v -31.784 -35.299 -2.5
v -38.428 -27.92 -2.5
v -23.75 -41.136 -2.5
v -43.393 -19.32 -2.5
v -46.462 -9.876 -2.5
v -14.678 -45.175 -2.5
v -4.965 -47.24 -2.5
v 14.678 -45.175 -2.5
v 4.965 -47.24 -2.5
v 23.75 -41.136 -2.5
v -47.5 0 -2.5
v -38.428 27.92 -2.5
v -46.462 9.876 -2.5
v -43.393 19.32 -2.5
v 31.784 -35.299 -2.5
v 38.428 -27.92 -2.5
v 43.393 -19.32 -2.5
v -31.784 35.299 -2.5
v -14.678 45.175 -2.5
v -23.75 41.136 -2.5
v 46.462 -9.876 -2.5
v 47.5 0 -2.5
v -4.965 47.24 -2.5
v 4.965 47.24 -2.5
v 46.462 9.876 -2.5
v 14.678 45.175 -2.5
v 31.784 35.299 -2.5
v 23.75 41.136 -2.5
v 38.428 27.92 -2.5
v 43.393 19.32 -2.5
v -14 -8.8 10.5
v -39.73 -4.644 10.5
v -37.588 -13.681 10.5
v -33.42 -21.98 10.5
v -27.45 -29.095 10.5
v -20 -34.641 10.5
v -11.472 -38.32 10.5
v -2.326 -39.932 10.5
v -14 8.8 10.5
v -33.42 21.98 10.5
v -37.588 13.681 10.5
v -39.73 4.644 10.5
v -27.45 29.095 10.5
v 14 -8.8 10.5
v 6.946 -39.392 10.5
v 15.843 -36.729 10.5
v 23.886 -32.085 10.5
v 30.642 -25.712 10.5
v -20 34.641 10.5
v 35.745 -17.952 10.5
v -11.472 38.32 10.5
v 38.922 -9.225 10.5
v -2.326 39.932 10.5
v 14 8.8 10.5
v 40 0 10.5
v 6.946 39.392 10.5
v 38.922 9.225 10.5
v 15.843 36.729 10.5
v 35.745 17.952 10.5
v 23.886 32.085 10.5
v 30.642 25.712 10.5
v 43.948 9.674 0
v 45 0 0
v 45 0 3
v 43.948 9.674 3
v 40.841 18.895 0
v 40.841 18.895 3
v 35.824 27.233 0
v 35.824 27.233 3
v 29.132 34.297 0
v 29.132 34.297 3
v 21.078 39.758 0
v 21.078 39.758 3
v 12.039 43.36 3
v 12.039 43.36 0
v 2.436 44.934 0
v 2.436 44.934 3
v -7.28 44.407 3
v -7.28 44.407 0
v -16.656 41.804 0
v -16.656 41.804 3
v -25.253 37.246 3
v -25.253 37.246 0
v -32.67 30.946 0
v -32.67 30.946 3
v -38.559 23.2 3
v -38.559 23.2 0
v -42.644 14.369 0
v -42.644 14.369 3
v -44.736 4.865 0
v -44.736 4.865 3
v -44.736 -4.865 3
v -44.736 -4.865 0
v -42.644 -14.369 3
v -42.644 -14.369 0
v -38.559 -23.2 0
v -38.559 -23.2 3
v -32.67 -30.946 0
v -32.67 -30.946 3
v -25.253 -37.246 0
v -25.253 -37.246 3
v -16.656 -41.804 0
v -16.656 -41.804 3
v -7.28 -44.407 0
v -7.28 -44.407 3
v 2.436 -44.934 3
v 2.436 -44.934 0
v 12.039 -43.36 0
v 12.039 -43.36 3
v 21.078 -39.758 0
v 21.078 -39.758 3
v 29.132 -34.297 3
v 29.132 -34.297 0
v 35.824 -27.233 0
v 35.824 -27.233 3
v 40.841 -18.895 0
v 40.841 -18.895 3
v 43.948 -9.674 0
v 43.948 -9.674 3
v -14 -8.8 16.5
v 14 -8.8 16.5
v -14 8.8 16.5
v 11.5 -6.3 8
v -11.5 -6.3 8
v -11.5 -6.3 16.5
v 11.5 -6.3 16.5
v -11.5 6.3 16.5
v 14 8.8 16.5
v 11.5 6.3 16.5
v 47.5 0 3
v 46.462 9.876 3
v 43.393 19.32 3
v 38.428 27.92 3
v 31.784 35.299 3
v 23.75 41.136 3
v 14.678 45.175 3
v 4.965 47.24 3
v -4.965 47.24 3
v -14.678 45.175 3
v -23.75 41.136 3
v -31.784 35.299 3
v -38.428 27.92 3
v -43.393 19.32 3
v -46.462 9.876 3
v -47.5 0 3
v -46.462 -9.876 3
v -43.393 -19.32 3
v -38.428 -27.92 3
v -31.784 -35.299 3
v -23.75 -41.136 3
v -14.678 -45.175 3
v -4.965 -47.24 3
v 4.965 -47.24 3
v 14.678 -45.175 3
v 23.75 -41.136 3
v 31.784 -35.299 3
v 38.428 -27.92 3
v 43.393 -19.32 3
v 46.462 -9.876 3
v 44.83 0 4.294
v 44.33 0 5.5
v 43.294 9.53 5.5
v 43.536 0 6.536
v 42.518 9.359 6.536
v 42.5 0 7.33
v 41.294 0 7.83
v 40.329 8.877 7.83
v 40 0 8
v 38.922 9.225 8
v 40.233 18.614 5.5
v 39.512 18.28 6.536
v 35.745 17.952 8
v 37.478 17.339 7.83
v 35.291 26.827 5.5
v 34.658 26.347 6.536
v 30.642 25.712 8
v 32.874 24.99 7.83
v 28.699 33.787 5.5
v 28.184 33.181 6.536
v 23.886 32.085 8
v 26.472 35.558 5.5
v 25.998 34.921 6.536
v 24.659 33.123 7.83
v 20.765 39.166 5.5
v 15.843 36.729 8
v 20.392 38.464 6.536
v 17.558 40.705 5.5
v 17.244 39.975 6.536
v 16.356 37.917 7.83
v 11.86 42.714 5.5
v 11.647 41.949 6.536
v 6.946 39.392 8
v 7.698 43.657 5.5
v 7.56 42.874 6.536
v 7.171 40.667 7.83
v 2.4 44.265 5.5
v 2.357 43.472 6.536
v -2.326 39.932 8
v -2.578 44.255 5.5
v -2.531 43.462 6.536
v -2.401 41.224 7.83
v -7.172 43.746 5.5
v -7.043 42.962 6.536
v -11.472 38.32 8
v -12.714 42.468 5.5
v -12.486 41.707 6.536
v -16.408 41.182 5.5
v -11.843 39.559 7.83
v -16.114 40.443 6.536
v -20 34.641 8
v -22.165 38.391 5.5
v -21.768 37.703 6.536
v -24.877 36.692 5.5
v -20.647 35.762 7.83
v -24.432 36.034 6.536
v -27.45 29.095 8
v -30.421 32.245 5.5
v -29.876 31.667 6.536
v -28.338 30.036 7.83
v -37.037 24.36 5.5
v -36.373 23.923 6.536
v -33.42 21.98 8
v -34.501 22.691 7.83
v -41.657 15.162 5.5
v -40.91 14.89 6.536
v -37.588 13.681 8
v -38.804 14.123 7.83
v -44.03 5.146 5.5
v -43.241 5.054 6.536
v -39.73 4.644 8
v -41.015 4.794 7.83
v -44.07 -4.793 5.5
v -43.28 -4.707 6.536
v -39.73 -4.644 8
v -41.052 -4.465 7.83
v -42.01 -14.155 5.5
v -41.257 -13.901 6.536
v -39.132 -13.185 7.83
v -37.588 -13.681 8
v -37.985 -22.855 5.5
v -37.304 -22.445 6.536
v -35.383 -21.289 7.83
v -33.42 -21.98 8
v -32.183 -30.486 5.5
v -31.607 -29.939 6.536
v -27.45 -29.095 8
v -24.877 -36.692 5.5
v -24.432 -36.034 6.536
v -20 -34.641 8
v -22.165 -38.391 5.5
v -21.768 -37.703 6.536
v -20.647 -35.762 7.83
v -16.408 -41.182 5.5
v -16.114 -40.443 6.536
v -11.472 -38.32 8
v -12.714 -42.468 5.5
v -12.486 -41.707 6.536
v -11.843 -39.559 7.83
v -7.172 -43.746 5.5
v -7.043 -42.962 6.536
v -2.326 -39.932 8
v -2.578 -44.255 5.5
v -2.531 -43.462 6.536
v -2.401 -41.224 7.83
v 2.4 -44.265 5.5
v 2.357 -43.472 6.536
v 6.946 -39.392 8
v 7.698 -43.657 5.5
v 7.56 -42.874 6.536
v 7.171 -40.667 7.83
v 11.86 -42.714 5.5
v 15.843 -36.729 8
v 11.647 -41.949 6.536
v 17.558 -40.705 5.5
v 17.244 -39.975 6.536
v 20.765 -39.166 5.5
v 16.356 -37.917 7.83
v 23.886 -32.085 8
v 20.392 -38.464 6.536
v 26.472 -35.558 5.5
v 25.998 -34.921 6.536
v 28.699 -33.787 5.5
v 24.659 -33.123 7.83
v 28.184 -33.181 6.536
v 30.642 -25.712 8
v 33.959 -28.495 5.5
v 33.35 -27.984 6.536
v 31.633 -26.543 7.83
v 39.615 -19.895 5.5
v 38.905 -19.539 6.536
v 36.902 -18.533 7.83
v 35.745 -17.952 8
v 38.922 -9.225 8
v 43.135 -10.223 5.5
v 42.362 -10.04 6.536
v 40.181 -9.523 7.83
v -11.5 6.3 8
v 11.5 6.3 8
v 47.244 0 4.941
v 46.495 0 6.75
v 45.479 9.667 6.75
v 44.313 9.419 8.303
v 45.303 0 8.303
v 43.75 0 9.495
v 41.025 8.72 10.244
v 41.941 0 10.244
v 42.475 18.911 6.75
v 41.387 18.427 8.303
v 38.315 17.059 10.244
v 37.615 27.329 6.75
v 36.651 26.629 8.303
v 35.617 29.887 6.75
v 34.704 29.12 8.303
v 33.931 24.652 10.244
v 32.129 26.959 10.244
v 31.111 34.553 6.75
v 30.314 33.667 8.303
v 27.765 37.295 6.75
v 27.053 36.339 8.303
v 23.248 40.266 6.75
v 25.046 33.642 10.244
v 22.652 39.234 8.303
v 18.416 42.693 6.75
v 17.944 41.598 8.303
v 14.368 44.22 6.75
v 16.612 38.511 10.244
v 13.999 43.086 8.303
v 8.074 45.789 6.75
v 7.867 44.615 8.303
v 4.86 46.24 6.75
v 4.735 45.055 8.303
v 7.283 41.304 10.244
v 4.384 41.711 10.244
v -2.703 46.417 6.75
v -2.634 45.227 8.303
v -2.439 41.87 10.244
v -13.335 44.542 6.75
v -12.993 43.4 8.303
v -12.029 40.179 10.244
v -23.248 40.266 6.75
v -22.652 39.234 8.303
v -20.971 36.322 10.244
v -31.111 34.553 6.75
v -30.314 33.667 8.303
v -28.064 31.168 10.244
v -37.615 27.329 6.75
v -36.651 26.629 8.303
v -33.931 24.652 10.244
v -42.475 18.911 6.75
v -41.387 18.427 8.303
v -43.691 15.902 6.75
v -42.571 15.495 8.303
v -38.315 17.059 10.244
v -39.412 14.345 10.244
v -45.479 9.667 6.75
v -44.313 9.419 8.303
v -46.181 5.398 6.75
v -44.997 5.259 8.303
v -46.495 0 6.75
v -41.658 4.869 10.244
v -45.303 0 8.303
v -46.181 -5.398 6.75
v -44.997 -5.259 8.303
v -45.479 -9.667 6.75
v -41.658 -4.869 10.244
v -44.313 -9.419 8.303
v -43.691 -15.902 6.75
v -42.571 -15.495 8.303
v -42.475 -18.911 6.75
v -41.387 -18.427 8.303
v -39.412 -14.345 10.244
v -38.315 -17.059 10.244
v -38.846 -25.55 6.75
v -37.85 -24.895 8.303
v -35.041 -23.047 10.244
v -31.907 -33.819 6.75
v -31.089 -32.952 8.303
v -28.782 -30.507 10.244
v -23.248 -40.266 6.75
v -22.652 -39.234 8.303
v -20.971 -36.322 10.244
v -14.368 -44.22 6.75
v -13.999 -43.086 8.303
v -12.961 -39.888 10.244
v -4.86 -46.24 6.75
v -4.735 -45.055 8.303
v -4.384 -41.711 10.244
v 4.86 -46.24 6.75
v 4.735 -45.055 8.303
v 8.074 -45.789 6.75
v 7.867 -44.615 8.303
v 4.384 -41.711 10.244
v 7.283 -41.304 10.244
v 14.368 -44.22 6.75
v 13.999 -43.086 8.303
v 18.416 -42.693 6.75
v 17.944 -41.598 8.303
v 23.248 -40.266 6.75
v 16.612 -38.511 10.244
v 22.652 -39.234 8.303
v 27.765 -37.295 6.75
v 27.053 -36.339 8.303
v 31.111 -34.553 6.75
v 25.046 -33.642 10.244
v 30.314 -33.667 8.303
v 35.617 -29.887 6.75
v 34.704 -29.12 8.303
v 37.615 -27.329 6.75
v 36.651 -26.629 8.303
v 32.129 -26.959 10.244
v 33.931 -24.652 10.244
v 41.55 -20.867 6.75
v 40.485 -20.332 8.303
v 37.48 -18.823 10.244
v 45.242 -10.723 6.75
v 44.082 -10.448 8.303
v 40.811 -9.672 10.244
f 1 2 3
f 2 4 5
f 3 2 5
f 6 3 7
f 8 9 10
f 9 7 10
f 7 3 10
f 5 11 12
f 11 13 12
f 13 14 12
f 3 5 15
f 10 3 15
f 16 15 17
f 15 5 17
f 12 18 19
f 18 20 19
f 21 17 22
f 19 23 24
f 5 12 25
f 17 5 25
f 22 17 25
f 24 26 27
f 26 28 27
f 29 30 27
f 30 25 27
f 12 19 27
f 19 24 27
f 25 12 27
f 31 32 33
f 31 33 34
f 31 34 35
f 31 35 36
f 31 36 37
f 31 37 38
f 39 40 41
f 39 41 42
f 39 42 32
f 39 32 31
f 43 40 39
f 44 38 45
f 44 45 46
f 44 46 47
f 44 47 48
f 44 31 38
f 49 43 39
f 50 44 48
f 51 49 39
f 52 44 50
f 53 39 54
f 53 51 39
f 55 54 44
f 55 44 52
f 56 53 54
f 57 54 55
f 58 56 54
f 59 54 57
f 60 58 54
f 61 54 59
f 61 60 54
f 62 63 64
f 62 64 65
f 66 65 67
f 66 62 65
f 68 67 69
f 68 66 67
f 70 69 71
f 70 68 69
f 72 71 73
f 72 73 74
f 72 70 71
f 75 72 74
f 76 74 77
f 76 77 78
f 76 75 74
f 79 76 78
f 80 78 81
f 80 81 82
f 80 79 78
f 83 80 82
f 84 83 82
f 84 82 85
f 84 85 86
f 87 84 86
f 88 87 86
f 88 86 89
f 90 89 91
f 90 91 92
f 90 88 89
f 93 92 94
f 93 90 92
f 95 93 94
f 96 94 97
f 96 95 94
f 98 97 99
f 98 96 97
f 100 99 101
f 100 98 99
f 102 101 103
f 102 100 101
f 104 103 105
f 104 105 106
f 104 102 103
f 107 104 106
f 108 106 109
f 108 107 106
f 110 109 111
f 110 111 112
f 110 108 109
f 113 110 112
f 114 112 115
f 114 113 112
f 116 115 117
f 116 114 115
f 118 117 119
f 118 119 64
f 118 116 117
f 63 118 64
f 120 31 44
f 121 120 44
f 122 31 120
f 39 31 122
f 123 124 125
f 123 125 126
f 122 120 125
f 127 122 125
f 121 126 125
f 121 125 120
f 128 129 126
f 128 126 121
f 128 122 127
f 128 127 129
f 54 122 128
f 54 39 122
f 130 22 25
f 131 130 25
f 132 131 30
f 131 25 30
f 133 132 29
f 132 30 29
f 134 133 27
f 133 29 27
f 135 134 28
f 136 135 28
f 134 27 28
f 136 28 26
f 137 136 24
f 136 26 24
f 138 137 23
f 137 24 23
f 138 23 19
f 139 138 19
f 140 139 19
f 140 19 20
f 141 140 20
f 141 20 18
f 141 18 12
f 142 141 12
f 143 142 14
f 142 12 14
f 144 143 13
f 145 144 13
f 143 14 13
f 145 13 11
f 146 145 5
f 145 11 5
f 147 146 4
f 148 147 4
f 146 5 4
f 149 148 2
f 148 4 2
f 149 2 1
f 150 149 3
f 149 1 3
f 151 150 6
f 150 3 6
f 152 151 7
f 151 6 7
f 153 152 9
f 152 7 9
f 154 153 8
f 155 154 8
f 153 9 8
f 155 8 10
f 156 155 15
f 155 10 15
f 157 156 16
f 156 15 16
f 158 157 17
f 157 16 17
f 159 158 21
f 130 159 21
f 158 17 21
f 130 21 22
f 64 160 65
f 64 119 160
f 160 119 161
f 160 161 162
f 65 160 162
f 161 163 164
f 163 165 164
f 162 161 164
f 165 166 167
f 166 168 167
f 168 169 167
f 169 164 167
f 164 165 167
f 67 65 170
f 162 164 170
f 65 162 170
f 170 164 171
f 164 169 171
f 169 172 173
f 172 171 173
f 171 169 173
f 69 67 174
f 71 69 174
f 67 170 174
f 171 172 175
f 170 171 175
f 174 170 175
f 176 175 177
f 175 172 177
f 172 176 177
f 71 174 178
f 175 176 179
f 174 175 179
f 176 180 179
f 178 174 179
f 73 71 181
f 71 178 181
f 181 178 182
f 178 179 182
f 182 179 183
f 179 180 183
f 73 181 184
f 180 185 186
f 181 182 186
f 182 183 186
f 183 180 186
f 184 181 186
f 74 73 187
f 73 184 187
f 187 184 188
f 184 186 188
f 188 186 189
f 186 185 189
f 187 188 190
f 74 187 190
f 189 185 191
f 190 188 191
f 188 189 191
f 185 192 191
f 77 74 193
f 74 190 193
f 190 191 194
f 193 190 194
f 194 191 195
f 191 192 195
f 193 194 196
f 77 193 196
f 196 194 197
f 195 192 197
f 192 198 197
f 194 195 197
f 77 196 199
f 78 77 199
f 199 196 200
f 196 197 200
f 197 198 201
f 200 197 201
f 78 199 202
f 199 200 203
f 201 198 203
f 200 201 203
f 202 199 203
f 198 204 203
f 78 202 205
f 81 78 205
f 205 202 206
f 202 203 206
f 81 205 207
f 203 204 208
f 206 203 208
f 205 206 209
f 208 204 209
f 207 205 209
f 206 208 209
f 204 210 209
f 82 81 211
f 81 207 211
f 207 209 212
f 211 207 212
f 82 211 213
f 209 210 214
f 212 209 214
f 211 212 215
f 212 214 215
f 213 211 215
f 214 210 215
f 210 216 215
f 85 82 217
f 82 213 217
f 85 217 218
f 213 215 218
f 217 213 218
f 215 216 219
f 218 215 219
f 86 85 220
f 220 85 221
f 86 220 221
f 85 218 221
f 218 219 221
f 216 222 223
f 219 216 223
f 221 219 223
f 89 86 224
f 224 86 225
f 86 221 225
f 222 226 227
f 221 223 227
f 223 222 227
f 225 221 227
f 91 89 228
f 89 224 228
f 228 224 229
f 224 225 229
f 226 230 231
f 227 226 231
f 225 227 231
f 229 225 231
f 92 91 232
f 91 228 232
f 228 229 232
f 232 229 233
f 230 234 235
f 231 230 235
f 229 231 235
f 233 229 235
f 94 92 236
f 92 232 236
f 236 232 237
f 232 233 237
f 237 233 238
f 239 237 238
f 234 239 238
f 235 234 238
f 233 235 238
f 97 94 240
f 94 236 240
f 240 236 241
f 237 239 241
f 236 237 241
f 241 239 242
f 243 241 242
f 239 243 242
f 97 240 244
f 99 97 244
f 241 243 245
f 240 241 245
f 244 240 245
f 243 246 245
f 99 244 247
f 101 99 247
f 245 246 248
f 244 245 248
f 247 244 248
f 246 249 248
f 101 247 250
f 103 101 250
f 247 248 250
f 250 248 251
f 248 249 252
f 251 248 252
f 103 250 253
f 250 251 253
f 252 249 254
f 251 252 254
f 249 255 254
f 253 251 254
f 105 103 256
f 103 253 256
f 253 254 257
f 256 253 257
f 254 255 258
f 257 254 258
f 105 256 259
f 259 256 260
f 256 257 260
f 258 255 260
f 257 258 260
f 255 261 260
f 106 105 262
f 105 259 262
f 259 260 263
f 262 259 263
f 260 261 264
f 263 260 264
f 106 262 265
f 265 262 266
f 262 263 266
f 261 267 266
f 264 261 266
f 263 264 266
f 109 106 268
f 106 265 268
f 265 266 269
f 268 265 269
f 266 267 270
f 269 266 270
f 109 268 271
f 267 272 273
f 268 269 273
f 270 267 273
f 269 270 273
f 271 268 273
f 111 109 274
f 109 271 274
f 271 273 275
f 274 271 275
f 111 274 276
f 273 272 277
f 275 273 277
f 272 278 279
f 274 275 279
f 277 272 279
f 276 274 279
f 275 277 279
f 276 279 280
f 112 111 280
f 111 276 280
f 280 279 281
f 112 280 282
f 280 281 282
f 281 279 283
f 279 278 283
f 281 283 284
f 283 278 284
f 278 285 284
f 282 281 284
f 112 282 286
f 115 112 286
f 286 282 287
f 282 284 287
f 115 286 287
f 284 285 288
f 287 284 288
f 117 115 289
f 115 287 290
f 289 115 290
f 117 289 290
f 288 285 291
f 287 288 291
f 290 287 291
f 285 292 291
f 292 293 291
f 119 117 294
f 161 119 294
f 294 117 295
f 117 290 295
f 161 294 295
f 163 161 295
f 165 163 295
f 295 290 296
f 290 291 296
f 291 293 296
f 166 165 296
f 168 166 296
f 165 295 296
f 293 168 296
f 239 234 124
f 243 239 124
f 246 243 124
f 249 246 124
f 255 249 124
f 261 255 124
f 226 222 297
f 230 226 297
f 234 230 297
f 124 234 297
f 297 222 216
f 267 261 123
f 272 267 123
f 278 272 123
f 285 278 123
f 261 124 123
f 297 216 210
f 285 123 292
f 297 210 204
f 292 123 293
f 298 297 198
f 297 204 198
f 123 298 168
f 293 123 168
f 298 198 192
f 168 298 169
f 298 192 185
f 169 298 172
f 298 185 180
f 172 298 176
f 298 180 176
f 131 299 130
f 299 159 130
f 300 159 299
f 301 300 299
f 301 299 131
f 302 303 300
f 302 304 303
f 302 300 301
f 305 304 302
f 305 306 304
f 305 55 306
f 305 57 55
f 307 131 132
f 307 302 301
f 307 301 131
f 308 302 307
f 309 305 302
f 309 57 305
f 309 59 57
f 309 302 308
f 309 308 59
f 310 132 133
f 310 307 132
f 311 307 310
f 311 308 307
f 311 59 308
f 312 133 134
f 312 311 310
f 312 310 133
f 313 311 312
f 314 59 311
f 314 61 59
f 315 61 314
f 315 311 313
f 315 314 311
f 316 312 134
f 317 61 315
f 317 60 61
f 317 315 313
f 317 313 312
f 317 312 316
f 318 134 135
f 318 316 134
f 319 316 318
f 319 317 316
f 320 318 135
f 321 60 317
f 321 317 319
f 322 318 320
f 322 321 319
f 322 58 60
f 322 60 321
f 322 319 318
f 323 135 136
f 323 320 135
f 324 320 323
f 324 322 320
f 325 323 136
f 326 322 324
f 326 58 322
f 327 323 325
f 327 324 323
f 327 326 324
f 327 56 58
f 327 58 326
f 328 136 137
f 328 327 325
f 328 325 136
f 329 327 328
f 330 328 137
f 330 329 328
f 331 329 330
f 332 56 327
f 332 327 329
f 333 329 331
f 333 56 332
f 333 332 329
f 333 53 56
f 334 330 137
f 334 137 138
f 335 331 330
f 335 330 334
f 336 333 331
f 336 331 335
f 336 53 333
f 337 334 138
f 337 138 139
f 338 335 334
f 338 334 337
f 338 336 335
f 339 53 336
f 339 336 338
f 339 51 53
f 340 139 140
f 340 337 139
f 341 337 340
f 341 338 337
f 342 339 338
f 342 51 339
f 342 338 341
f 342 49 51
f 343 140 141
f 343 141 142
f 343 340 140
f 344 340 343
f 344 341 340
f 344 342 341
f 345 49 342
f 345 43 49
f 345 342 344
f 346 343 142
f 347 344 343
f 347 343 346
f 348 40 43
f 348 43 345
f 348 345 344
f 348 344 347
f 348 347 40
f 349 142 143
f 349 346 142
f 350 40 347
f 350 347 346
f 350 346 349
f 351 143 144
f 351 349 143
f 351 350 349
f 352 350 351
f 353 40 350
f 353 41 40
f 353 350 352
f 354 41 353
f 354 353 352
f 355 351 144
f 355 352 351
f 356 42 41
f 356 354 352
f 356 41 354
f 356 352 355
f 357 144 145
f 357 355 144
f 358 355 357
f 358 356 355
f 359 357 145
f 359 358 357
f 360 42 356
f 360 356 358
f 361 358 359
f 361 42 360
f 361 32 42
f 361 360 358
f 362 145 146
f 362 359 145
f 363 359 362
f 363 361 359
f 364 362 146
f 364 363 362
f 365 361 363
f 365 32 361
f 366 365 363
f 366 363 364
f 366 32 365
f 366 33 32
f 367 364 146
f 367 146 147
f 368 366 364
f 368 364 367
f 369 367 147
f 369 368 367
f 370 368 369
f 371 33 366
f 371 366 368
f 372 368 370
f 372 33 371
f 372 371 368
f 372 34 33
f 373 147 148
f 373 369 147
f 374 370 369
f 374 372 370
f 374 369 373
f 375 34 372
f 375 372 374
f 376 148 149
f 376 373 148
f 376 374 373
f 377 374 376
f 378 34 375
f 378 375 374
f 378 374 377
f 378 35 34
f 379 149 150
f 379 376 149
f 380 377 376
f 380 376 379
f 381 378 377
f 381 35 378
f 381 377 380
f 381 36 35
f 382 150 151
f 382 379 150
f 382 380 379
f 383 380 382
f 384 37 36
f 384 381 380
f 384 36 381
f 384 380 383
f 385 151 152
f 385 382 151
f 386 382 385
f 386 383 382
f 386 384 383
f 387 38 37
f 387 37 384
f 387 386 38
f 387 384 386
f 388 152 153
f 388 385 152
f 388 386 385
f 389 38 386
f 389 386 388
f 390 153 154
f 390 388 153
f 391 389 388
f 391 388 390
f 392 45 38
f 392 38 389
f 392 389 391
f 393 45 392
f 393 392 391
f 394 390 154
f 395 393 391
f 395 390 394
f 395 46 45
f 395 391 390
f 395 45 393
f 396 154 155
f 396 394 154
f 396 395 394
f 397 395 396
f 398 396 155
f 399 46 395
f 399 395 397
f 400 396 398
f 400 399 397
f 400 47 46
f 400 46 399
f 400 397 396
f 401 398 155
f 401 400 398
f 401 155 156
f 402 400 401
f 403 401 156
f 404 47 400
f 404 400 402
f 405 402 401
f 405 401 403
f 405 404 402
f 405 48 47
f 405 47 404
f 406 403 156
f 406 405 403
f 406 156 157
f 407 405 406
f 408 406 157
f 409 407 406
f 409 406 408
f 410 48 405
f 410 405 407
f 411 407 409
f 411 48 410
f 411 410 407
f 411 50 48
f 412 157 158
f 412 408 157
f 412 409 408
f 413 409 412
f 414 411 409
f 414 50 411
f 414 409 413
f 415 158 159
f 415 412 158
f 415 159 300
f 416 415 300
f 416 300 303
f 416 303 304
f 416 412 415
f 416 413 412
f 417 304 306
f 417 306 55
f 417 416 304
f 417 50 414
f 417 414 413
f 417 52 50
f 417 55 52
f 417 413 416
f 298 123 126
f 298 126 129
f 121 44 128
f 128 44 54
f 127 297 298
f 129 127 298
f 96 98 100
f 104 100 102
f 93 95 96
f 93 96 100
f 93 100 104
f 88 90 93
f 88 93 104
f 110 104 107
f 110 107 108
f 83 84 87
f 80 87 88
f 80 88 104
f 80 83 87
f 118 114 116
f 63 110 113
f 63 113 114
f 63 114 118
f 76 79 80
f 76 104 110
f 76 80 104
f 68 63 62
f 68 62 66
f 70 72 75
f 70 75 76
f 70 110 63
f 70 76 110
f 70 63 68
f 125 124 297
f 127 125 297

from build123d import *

# Parameters (mm, degrees)
F0_R     = 45
F1_DEPTH = 8
F2_R     = 5
F3_W     = 23
F3_H     = 12.6
F4_DEPTH = 16.5
F5_T     = 2.5


with BuildPart() as f1:
    # F0 (on Top) → F1 (new body)
    with BuildSketch(Plane.XY):
        Circle(F0_R)
    extrude(amount=F1_DEPTH)

    # F2
    f2_edges = [f1.edges().sort_by_distance(p)[0] for p in [
        (-45, 0, 8),
    ]]
    fillet(f2_edges, radius=F2_R)

    # F3 (on Top) → F4 (join)
    with BuildSketch(Plane.XY):
        Rectangle(F3_W, F3_H)
    extrude(amount=F4_DEPTH)

    # F5
    f5_openings = [f1.faces().sort_by_distance(p)[0] for p in [
        (0, 0, 16.5),
    ]]
    offset(amount=F5_T, openings=f5_openings, kind=Kind.INTERSECTION)


solid = f1.part
